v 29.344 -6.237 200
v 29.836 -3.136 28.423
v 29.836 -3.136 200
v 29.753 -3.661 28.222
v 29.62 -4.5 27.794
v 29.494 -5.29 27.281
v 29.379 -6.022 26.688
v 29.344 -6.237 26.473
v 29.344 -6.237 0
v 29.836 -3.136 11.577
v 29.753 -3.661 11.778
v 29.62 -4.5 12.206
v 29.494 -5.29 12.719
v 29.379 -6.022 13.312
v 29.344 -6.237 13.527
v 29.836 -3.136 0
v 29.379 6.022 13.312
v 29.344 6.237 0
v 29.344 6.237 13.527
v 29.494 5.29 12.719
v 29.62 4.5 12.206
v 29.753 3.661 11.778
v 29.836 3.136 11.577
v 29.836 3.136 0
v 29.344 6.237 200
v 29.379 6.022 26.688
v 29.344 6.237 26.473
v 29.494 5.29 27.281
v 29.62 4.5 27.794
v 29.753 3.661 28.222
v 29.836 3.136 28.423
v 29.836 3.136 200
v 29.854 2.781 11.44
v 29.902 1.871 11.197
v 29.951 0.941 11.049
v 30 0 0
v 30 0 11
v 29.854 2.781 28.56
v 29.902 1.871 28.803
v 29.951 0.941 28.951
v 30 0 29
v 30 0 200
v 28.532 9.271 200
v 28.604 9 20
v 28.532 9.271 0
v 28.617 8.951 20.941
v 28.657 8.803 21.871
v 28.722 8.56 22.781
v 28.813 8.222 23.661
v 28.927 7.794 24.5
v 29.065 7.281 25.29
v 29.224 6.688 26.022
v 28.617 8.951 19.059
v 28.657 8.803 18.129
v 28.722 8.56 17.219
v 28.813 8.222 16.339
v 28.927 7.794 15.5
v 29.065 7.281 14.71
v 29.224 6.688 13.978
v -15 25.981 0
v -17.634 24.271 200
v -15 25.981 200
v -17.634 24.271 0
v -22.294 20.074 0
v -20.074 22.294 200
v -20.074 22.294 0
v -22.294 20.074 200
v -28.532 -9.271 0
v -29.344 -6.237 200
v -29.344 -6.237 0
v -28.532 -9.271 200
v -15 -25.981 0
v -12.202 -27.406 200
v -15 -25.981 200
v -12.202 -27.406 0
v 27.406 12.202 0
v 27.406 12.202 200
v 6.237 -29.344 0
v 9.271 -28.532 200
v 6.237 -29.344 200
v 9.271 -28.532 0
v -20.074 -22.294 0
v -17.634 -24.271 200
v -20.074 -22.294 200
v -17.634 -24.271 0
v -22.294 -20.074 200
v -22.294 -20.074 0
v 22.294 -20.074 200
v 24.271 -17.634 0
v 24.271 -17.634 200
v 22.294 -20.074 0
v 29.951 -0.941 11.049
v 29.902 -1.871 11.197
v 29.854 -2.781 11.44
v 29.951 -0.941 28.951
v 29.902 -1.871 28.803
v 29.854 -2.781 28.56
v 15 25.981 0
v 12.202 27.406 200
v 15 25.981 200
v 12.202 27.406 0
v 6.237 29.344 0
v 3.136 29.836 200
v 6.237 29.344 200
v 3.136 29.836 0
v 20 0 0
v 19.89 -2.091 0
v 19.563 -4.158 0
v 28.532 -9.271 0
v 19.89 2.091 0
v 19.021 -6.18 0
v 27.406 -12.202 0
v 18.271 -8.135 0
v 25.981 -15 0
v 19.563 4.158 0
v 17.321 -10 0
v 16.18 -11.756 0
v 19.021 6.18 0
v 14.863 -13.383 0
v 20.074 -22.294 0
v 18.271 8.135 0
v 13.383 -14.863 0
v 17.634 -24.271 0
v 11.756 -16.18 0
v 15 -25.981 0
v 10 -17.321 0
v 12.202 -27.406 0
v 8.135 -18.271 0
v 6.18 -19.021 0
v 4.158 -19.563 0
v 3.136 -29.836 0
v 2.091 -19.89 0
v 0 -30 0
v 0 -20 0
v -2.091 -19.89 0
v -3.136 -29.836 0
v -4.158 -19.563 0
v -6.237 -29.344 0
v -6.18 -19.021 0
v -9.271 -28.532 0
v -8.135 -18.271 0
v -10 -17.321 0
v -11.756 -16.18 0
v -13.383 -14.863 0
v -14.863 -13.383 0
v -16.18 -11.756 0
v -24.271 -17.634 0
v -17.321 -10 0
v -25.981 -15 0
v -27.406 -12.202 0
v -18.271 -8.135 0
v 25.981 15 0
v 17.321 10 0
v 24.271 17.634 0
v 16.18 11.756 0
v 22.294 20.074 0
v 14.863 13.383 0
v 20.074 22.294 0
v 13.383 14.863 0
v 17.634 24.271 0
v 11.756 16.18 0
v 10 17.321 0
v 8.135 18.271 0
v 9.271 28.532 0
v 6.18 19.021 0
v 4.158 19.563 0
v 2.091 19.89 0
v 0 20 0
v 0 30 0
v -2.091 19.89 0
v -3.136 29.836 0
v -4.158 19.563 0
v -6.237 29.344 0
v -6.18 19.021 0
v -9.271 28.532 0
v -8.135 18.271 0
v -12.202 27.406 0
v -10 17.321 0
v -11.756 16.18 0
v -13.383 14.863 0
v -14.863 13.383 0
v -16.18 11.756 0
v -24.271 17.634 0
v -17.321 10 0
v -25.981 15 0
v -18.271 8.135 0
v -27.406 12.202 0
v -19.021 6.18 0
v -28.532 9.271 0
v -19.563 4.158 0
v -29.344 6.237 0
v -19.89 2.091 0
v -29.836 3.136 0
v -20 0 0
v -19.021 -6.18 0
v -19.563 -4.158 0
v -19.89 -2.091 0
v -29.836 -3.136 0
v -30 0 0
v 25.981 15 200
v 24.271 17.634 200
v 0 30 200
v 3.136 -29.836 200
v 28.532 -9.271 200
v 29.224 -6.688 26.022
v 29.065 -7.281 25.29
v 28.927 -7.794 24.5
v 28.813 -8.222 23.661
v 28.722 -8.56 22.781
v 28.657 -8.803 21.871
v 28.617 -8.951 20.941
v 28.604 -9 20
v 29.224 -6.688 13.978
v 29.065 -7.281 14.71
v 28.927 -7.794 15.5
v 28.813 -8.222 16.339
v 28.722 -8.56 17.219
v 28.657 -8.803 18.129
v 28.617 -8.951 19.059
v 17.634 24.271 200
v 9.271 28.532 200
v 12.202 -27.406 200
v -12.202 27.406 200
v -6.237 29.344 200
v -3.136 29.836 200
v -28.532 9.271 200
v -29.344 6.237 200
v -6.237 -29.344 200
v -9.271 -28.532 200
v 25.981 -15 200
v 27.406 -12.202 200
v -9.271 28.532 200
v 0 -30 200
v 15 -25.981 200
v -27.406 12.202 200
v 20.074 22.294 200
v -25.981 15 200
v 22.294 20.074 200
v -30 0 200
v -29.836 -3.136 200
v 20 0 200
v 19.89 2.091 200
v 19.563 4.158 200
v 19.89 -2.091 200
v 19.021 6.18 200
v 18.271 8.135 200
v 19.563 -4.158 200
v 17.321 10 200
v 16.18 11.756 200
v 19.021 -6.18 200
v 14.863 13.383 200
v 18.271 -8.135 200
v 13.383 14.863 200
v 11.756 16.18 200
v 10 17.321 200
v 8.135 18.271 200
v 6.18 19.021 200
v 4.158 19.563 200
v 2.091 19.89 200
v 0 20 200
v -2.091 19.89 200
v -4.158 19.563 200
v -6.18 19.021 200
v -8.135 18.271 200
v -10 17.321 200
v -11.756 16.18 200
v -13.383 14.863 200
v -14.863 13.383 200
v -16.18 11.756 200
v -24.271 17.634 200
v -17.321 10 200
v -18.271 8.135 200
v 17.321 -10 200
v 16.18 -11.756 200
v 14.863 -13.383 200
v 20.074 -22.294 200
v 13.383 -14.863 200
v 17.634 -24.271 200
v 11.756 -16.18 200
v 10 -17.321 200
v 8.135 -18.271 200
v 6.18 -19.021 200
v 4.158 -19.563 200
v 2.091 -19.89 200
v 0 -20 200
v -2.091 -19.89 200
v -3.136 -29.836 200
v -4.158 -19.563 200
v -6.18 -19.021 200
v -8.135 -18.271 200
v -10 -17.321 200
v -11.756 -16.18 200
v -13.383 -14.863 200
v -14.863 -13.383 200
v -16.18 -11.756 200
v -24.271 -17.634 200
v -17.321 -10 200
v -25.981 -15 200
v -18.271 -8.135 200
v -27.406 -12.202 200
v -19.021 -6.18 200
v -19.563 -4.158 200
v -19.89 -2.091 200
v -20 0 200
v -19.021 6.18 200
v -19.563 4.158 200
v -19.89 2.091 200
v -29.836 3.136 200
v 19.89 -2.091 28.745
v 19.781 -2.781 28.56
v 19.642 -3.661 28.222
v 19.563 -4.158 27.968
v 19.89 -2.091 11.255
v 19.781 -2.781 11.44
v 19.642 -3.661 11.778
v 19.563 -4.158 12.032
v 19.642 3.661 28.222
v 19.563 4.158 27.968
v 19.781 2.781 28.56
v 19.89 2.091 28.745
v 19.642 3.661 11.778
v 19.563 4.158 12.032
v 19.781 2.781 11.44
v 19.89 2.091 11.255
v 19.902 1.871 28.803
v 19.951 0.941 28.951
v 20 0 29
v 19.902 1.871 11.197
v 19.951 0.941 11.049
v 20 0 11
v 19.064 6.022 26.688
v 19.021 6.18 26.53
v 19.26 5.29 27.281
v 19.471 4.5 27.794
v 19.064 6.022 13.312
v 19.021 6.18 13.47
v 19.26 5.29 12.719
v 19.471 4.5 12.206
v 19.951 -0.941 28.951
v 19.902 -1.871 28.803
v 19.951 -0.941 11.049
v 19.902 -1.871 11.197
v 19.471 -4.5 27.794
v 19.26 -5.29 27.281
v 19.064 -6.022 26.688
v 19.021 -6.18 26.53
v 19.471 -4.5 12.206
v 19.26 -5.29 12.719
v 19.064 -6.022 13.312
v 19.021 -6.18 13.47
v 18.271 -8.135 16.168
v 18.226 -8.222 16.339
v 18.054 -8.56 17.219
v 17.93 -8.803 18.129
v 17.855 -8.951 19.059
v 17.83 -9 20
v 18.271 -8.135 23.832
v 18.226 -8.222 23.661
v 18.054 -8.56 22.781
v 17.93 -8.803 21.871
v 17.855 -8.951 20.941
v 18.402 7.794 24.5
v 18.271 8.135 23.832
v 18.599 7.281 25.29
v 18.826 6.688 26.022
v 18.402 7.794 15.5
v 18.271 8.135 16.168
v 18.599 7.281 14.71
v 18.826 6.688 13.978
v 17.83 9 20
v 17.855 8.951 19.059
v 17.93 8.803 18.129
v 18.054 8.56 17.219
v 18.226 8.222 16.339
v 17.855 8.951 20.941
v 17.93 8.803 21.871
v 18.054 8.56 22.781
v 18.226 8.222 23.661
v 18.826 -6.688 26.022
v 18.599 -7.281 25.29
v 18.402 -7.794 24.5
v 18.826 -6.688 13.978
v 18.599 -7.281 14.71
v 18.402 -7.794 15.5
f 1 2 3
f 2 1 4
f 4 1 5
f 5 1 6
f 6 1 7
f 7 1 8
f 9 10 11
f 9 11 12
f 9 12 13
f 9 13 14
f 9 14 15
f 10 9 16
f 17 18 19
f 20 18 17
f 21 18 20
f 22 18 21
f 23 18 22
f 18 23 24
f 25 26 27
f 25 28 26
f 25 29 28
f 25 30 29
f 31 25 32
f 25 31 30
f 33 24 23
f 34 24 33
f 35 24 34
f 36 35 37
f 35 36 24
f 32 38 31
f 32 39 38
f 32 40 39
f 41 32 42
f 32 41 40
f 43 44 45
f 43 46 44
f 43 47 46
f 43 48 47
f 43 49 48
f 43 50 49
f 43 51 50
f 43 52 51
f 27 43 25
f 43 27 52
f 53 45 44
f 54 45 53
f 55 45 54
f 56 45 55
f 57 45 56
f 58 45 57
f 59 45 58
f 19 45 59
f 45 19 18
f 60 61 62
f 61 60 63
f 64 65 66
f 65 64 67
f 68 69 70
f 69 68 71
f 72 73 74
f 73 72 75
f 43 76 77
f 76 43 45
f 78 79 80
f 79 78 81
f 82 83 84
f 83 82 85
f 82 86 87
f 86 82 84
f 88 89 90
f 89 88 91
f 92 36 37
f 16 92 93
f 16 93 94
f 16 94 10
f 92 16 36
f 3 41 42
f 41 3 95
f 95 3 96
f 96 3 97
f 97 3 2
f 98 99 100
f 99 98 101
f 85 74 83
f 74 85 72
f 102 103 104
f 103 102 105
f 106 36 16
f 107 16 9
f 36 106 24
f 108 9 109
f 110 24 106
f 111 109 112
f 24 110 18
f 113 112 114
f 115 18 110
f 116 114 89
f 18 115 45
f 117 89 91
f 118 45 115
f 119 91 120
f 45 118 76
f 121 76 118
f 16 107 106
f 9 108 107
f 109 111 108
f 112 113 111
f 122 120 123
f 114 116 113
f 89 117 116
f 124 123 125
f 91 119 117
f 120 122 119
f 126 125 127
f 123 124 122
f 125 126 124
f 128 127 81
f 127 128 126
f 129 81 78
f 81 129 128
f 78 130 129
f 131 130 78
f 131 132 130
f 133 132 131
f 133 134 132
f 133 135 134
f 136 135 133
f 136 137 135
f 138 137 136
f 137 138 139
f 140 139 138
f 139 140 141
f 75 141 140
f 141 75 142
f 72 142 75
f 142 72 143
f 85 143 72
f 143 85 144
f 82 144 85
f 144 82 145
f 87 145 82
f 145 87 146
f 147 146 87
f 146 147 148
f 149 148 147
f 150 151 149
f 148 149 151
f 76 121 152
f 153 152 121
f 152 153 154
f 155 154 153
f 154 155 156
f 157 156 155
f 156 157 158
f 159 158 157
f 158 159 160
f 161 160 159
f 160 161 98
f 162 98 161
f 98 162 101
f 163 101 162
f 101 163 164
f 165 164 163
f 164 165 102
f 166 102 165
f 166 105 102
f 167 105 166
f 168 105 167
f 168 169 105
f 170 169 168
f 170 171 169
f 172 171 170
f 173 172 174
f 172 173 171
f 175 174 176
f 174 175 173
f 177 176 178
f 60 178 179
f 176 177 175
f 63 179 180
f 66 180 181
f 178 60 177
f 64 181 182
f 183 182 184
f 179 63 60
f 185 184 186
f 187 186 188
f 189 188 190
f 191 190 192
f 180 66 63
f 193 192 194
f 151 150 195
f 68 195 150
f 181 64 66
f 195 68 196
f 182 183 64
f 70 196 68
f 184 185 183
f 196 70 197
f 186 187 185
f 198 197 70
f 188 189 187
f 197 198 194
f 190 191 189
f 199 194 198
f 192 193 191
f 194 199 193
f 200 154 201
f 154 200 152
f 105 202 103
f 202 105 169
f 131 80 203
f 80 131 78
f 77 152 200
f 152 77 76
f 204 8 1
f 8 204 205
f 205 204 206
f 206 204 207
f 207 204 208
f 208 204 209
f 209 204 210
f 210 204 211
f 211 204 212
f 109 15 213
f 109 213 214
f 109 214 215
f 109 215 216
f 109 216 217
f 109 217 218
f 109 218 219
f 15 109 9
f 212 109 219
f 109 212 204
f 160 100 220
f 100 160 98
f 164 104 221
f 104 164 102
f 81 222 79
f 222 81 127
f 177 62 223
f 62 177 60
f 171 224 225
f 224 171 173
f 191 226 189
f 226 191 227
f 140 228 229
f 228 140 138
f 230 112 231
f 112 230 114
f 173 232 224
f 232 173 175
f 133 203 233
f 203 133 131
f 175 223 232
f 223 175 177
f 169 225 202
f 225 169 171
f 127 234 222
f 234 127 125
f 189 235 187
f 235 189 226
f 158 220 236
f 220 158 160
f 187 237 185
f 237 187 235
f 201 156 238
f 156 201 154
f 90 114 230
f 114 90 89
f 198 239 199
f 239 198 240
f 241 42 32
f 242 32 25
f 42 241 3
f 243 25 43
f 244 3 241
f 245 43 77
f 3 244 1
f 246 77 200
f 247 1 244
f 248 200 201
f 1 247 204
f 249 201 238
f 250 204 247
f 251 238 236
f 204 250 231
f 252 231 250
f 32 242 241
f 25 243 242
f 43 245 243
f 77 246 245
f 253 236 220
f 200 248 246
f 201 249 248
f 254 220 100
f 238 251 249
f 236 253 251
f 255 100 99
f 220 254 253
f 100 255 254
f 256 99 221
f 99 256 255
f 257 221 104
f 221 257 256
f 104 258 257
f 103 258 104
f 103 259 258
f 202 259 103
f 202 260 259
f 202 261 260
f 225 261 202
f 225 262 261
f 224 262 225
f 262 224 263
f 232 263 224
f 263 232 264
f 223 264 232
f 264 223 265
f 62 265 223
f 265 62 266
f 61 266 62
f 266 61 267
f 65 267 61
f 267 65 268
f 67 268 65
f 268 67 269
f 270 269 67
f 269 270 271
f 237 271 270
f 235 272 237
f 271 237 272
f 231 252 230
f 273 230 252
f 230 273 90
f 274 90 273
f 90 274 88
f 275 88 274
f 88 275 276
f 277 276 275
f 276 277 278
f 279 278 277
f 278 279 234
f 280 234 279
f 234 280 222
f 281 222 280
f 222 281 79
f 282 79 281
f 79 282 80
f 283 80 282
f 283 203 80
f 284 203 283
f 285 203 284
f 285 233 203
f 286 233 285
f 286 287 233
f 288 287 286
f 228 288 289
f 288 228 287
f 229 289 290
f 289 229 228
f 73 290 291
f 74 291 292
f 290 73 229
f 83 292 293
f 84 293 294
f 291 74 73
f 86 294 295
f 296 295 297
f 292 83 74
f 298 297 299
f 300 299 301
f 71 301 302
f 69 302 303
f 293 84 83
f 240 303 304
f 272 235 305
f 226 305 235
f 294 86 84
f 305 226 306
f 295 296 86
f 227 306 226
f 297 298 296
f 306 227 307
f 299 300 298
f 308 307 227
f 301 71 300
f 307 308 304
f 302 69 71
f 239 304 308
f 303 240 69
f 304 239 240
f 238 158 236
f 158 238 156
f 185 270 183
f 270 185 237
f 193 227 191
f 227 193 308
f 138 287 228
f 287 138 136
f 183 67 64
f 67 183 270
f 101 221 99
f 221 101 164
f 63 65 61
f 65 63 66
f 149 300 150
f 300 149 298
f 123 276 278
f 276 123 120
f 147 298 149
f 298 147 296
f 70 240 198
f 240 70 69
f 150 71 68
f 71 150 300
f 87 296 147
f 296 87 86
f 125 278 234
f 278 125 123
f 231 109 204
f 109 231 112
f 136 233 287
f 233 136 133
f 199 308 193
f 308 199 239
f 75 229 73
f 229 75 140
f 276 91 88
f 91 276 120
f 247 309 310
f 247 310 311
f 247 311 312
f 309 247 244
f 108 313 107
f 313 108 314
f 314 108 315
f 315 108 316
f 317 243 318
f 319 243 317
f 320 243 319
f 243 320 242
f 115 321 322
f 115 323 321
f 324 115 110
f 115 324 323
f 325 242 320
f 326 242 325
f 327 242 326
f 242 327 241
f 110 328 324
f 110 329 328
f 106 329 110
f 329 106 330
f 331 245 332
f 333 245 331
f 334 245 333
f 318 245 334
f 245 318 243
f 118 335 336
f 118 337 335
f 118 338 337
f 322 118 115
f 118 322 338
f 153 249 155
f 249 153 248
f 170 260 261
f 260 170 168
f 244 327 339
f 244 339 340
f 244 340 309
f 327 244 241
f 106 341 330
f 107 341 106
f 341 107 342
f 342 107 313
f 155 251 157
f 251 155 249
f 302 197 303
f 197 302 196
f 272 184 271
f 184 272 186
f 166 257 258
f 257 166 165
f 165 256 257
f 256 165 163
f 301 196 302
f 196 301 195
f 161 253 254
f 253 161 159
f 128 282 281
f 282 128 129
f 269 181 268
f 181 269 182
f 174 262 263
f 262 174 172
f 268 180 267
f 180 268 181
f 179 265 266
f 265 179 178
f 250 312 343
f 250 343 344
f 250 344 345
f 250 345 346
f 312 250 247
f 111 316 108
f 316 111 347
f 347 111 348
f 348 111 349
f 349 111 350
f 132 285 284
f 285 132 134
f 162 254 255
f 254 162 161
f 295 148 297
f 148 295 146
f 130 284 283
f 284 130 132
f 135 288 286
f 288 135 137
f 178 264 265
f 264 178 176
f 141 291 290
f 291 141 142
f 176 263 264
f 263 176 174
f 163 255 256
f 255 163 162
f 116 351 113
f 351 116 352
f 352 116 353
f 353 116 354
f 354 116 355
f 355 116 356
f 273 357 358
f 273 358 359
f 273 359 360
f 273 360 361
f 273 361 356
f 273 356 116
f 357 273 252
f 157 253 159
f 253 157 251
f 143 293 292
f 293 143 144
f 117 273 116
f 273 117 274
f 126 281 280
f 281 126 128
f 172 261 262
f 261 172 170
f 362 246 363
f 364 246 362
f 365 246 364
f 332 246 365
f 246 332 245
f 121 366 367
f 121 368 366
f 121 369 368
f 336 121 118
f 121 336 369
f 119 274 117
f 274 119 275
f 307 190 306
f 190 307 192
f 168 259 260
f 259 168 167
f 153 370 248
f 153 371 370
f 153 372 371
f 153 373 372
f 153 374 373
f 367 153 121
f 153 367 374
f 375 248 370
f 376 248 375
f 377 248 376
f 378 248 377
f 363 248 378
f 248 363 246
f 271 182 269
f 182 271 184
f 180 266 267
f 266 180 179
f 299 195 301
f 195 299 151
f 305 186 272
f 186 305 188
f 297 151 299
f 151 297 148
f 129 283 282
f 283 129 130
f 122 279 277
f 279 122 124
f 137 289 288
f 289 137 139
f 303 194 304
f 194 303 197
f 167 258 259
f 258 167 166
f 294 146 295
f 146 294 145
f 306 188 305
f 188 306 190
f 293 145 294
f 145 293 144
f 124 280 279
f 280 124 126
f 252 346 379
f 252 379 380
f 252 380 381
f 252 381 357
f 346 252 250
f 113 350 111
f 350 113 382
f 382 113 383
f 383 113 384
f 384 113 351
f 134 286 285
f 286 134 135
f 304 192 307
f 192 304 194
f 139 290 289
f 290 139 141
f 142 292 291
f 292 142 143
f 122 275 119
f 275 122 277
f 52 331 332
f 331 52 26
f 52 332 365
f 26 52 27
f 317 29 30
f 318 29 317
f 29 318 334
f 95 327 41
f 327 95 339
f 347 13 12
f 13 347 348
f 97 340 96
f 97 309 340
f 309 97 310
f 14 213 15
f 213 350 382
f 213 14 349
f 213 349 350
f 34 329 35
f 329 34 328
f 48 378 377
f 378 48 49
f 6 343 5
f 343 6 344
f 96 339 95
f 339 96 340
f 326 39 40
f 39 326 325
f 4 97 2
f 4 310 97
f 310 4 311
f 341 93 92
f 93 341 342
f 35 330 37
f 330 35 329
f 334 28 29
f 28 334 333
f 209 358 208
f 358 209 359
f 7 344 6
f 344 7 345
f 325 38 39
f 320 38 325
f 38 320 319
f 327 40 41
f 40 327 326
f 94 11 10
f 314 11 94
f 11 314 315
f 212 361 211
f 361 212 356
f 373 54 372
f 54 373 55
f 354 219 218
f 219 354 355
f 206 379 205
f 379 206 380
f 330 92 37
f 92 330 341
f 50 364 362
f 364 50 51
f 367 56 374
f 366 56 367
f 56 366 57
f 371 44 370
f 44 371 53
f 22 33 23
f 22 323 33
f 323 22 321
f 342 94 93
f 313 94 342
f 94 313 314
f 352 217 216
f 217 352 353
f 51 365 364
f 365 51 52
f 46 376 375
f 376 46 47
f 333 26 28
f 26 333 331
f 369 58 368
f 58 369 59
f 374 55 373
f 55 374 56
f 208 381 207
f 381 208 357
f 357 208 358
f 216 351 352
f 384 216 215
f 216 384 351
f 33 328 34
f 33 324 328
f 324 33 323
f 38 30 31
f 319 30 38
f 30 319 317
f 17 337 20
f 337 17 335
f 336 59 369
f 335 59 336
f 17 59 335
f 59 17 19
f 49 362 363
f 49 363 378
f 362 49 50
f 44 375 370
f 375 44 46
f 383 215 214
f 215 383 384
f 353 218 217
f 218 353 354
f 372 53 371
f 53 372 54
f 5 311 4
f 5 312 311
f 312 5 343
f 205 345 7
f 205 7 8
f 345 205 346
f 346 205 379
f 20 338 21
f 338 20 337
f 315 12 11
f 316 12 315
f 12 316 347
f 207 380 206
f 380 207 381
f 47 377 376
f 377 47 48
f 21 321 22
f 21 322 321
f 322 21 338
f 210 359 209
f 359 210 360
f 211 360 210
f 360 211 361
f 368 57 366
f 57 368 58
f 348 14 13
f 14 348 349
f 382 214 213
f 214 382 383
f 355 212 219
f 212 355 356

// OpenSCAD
// file: lib/shapes.scad
/*
 * Shapes
 */

module tube(r1=20,r2=20,h=200,w=10) {
  difference() {
    cylinder(r1=r1+w,r2=r2+w,h=h);
    translate([0,0,-0.01]) #cylinder(r1=r1,r2=r2,h=h+0.02);
  }
}
// file: headjoint.scad
/*
 * Headjoint
 */
use <lib/shapes.scad>;

module headjoint(r1=20,r2=20,h=200,w=10) {
  difference() {
    tube(r1=r1,r2=r2,h=h,w=w);
    translate([r1+w+1,0,20])
      rotate([0,-90,0])
        #cylinder(r1=9,r2=9,h=w*1.5);
  }
}
// file: lib/config.scad
/*
 * Configuration variables
 */

/* default minimum fragment angle (deg) */
fa = 6;
$fa = fa;
echo(fa=fa);

/* default minimum fragment size (mm) */
fs = 0.5;
$fs = fs;
echo(fs=fs);
// main file
/*
 * Parametric CSG Flute Model
 *   Author: Isaac W Hanson
 *   License: MIT
 */
include <lib/config.scad>
use <headjoint.scad>

color("BurlyWood")
  headjoint();
